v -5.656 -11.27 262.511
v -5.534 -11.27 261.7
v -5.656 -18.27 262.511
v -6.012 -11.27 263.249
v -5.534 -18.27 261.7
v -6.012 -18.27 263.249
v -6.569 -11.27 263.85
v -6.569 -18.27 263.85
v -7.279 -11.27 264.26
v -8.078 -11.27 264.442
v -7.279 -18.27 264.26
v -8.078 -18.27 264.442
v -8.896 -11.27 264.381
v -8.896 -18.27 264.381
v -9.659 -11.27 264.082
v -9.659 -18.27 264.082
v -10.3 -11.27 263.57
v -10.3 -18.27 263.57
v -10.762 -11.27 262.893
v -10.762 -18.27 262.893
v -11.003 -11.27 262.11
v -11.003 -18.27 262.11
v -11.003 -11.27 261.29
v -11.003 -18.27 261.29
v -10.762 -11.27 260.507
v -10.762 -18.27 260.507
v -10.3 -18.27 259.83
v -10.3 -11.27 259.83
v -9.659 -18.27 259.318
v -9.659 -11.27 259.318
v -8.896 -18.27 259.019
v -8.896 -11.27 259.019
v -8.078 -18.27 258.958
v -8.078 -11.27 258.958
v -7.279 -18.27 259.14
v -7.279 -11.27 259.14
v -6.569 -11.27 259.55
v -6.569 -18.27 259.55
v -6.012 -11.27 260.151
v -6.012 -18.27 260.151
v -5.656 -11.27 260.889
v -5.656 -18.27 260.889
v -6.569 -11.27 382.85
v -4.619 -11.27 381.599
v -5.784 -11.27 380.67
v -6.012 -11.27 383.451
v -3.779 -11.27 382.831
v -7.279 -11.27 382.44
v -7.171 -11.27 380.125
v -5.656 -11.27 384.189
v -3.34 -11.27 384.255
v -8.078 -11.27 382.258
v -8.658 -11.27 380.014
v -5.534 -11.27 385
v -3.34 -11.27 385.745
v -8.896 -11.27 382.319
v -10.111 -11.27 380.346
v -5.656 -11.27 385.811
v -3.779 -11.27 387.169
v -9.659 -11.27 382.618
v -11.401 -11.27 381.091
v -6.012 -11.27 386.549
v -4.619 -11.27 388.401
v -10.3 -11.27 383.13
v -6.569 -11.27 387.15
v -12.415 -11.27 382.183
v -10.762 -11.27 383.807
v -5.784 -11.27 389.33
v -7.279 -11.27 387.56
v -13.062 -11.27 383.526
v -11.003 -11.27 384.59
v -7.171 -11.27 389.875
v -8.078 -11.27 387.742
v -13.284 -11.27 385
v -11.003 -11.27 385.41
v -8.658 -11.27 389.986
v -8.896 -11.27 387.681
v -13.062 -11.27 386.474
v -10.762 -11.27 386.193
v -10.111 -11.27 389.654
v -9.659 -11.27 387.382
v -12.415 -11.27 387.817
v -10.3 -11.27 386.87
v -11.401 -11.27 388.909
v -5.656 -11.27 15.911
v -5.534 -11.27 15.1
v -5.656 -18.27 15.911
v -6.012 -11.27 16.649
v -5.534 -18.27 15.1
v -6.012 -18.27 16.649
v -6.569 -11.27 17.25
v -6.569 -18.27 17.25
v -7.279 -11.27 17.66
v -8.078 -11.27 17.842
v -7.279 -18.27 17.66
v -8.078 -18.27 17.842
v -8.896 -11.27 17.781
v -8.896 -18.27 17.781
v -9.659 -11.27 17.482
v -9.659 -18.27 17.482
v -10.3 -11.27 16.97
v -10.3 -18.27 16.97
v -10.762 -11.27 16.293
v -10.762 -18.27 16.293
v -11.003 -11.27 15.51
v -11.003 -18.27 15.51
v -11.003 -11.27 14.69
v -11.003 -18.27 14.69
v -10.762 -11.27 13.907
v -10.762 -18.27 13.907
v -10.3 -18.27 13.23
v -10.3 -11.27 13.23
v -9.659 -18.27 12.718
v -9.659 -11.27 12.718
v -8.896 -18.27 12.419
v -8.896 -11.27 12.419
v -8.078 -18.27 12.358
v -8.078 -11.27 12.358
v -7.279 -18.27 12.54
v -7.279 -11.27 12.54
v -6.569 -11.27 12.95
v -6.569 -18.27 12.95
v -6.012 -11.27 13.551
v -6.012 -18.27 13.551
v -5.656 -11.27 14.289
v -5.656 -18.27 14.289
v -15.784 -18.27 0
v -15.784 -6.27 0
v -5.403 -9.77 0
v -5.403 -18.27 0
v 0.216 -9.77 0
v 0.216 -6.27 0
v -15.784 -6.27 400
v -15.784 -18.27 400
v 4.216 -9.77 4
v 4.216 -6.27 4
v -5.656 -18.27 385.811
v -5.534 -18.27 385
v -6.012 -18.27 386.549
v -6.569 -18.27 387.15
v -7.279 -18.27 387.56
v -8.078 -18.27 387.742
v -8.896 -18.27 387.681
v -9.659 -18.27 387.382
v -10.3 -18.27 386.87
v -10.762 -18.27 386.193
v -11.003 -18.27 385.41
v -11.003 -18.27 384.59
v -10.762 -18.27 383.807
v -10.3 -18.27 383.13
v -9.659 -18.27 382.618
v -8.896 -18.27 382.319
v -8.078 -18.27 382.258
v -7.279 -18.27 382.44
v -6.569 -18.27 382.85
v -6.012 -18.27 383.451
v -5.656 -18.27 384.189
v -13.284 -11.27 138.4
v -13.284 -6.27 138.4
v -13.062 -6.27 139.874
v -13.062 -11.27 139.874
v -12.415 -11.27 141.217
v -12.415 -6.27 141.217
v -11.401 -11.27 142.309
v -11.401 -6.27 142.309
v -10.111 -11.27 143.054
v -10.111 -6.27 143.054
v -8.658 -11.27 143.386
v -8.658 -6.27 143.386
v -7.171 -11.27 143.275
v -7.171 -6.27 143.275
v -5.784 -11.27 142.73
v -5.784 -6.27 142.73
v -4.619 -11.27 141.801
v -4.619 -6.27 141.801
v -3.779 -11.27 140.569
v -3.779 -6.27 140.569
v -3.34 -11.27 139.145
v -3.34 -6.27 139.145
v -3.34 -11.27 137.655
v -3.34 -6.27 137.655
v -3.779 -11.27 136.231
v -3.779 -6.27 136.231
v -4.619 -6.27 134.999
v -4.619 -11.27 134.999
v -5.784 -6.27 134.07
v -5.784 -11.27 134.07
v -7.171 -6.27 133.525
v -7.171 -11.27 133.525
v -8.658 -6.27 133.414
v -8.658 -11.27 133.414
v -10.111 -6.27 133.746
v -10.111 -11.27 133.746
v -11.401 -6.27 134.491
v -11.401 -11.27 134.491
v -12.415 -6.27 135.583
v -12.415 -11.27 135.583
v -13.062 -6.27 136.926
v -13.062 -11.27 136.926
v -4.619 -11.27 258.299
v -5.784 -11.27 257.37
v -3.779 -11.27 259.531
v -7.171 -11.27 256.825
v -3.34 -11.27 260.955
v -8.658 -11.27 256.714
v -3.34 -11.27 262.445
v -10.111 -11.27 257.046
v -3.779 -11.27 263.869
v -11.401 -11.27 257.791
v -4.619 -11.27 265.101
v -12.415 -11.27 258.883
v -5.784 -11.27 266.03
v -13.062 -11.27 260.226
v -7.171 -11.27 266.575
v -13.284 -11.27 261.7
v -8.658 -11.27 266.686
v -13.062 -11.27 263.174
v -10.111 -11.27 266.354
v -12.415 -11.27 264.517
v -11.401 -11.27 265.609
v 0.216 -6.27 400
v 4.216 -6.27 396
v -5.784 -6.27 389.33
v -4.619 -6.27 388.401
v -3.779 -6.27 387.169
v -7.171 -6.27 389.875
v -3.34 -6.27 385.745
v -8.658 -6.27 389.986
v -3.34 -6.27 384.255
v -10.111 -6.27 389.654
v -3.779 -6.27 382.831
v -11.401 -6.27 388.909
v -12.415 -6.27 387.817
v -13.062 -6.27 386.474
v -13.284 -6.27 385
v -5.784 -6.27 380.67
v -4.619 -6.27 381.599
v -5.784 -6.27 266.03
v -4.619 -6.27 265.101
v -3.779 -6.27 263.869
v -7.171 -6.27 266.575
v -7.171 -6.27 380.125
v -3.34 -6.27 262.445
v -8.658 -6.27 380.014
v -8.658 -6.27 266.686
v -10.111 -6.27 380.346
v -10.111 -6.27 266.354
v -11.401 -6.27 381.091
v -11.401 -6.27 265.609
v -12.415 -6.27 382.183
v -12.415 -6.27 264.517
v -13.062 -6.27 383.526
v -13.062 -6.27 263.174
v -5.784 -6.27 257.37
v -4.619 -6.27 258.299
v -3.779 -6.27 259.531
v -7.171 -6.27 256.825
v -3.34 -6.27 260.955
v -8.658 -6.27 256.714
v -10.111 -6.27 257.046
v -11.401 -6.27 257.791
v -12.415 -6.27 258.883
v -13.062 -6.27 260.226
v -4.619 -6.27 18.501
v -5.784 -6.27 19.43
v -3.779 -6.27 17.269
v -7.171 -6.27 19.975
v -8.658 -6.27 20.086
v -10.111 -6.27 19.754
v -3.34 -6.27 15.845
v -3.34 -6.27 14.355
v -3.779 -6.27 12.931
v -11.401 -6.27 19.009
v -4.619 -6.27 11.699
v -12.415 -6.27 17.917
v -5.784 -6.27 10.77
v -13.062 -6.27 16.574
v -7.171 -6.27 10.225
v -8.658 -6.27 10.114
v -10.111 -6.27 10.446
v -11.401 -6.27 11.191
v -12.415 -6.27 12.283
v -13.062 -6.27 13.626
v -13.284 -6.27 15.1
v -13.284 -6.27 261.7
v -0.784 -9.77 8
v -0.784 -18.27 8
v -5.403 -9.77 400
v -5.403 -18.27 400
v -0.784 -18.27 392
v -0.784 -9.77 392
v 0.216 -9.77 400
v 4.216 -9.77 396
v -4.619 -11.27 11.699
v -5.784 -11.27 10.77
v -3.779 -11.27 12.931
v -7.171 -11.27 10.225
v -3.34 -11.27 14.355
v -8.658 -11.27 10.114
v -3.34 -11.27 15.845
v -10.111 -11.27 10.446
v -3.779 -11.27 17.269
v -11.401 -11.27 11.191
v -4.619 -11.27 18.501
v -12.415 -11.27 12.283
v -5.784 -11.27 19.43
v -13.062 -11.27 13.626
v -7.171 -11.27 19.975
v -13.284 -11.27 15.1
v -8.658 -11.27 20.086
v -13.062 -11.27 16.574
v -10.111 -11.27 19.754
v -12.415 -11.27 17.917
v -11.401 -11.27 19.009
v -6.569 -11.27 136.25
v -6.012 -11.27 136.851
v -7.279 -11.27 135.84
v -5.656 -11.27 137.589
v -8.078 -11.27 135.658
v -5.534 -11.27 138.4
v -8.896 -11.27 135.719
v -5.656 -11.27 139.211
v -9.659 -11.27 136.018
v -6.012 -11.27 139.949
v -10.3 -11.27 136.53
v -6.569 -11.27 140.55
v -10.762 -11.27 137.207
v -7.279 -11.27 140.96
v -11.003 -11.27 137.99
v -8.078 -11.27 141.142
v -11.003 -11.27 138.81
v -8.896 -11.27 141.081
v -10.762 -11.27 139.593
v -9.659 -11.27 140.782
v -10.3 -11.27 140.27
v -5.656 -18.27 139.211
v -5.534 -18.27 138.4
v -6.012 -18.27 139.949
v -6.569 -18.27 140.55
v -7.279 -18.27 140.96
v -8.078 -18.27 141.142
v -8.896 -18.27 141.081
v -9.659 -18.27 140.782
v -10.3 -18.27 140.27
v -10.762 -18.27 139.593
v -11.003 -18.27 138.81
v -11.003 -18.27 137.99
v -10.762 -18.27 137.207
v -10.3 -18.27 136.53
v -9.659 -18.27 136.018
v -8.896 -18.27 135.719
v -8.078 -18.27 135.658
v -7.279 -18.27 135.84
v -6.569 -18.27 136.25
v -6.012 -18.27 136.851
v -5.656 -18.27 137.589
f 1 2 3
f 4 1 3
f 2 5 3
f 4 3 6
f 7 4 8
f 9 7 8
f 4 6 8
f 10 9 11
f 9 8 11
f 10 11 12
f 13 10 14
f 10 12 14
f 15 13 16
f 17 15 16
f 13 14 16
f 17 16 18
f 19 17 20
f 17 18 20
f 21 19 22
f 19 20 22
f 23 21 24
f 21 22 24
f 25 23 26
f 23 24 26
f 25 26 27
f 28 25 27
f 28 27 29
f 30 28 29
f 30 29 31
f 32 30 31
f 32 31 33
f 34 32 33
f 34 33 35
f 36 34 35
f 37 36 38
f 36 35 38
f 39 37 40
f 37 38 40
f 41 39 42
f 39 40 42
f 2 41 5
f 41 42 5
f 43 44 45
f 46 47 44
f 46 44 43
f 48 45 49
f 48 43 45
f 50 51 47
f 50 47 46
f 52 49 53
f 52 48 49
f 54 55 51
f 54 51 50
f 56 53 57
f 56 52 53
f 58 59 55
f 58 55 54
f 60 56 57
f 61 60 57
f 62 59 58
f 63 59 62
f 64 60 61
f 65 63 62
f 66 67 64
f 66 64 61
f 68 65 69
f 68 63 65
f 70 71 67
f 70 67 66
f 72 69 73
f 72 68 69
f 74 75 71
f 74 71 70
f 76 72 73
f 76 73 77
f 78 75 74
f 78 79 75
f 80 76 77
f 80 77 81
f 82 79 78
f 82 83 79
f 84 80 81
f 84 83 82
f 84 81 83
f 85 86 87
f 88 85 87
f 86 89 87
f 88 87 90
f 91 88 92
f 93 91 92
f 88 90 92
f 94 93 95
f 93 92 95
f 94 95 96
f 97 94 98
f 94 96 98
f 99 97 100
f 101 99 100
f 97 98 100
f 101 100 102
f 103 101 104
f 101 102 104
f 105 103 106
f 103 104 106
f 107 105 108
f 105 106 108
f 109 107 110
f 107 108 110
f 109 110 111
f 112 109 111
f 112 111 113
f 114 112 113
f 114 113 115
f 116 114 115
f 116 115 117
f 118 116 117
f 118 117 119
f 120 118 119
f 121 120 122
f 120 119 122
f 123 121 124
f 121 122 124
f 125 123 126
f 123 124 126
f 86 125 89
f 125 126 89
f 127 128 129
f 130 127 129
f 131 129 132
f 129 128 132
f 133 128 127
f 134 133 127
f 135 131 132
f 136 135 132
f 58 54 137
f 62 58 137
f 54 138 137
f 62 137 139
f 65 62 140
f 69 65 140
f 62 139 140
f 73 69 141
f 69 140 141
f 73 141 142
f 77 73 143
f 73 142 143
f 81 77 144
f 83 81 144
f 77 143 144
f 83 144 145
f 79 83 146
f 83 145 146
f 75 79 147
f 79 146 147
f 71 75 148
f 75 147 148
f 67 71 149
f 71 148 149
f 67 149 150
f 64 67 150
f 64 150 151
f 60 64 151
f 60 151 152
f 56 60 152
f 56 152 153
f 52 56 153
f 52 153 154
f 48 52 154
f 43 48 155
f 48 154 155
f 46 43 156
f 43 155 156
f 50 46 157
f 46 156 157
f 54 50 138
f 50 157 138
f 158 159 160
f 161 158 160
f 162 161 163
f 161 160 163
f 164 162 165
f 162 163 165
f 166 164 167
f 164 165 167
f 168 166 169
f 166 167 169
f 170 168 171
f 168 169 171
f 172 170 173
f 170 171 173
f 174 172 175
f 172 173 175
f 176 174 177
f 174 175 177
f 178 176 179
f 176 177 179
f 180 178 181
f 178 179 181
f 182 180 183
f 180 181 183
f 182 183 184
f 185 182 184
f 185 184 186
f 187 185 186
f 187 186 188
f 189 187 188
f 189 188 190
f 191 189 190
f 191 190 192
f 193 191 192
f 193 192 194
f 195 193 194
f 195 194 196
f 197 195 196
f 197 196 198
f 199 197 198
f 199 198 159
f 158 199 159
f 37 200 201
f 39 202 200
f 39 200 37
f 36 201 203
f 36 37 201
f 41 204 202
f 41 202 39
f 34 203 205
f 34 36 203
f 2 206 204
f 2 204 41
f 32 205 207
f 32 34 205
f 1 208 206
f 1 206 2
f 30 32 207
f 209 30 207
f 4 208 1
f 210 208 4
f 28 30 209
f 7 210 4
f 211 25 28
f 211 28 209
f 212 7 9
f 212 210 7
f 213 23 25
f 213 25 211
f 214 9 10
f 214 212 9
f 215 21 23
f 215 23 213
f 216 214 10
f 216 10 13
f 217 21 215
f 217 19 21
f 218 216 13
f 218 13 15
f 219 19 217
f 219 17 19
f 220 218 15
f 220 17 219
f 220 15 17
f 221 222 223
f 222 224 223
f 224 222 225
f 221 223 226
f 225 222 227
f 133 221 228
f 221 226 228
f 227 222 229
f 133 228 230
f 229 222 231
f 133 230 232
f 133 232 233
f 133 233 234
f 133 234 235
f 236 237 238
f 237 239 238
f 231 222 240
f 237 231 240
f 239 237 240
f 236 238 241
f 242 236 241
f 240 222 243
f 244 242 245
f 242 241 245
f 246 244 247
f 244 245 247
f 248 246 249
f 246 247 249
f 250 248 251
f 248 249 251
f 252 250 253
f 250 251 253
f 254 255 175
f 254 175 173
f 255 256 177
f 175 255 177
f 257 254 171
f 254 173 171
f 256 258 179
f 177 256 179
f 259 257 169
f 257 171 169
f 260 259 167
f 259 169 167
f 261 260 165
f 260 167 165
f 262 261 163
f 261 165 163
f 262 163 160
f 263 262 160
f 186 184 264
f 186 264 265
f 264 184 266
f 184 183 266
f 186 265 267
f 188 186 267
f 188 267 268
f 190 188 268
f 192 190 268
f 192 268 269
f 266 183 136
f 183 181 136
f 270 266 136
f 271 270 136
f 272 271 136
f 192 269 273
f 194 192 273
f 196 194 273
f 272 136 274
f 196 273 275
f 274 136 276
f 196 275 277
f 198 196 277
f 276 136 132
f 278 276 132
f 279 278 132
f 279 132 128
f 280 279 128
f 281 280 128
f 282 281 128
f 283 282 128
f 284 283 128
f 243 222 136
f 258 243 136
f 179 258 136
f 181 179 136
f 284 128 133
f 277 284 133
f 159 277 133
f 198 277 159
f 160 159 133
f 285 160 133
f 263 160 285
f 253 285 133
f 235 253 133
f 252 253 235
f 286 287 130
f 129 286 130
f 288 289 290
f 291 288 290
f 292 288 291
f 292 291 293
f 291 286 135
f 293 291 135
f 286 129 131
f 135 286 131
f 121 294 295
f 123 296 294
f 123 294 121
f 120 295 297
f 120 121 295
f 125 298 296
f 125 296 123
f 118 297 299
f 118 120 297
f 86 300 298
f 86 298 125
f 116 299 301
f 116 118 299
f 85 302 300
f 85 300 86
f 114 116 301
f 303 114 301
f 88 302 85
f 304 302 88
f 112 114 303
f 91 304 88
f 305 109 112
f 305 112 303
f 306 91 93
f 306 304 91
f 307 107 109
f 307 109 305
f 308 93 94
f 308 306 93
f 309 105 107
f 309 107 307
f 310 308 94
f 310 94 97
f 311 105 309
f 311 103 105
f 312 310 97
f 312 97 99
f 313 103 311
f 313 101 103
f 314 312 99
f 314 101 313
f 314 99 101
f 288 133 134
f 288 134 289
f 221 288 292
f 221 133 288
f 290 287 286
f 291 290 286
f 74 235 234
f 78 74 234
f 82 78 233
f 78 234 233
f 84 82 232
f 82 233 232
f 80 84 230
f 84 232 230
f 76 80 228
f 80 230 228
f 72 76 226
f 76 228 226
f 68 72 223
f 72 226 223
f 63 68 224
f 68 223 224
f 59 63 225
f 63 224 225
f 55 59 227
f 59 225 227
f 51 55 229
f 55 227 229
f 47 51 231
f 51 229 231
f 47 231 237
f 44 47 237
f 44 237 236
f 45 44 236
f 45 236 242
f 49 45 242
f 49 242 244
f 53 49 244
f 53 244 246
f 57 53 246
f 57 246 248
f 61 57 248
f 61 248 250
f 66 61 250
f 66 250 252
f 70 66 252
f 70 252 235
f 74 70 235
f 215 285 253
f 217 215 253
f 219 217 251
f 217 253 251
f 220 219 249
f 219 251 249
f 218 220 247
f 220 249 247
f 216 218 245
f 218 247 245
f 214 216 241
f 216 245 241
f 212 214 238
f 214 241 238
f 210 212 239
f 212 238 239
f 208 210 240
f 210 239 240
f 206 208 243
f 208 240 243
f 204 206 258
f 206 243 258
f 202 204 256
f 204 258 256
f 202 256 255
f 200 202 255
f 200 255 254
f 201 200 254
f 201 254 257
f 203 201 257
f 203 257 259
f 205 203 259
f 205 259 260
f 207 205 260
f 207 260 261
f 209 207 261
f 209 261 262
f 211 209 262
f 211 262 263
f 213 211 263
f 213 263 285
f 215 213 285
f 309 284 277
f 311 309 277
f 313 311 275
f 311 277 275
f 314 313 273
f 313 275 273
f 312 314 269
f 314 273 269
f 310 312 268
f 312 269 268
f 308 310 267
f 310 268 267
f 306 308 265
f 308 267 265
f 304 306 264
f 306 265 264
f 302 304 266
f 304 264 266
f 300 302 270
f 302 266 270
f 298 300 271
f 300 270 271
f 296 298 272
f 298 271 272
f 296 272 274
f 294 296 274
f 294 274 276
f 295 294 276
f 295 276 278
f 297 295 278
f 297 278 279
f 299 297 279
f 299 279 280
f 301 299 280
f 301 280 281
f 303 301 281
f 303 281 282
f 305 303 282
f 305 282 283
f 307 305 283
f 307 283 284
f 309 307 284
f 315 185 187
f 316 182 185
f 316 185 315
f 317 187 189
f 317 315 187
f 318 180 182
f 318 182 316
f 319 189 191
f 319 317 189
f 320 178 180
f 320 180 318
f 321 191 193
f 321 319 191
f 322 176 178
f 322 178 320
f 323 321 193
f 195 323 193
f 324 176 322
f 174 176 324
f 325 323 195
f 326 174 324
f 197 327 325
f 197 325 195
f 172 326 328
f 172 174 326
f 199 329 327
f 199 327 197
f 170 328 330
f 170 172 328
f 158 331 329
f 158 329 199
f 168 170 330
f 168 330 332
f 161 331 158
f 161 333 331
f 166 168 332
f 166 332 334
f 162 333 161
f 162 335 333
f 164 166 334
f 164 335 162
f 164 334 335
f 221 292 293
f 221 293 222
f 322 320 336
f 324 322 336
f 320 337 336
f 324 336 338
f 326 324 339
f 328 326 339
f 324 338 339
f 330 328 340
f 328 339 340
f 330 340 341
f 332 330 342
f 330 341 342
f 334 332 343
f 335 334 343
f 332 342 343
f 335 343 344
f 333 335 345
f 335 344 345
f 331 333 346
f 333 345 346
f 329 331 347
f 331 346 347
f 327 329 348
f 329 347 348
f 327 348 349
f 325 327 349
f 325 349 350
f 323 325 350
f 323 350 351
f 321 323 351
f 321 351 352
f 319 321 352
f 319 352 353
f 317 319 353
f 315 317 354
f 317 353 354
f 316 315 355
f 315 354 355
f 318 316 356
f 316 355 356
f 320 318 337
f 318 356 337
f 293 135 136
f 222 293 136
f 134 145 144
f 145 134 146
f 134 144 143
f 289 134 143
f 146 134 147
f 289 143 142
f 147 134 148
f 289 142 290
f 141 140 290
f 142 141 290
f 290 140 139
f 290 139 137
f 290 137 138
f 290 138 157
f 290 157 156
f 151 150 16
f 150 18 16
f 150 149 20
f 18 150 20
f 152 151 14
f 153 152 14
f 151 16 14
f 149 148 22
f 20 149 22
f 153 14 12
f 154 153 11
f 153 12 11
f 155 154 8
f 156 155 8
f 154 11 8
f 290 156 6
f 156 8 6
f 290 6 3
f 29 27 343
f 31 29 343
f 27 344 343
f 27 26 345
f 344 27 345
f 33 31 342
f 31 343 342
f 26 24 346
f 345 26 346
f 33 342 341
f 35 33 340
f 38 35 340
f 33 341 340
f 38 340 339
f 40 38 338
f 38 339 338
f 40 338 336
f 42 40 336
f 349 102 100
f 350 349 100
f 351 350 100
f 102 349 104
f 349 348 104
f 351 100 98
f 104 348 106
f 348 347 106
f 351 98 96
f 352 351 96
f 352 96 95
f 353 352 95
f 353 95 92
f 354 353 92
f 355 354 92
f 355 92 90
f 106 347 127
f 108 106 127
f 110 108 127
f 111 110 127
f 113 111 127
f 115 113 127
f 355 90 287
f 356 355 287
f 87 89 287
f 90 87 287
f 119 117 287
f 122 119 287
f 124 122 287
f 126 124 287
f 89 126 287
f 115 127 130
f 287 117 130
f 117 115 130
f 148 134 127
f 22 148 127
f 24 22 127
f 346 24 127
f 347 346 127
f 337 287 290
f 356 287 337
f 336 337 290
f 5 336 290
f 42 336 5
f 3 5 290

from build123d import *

# Parameters (mm, degrees)
F1_DEPTH       = 400
F3_SIZE        = 4
F5_DEPTH       = 8.5
F6_D           = 5.5
F6_CBORE_D     = 10
F6_CBORE_DEPTH = 5


with BuildPart() as f1:
    # F0 (on Top) → F1 (new body)
    with BuildSketch(Plane.XY):
        Polygon((4.216131, -6.269906), (-15.783869, -6.269906), (-15.783869, -18.269906), (-0.783869, -18.269906), (-0.783869, -9.769906), (4.216131, -9.769906), align=None)
    extrude(amount=F1_DEPTH)

    # F3
    f3_edges = [f1.edges().sort_by_distance(p)[0] for p in [
        (4.216131, -8.019906, 400),
        (4.216131, -8.019906, 0),
    ]]
    chamfer(f3_edges, length=F3_SIZE)

    # F4 (on face) → F5 (cut)
    with BuildSketch(Plane.XZ.offset(18.269906)):
        Polygon((-0.783869, 392), (-0.783869, 400), (-5.402671, 400), align=None)
        Polygon((-0.783869, 0), (-0.783869, 8), (-5.402671, 0), align=None)
    extrude(amount=-F5_DEPTH, mode=Mode.SUBTRACT)

    # F6 (through all)
    with Locations(Plane(origin=(0, -6.269906, 0), x_dir=(-1, 0, 0), z_dir=(0, 1, 0))):
        with Locations((8.283869, 15.1), (8.283869, 138.4), (8.283869, 261.7), (8.283869, 385)):
            CounterBoreHole(F6_D / 2, F6_CBORE_D / 2, F6_CBORE_DEPTH)


solid = f1.part
